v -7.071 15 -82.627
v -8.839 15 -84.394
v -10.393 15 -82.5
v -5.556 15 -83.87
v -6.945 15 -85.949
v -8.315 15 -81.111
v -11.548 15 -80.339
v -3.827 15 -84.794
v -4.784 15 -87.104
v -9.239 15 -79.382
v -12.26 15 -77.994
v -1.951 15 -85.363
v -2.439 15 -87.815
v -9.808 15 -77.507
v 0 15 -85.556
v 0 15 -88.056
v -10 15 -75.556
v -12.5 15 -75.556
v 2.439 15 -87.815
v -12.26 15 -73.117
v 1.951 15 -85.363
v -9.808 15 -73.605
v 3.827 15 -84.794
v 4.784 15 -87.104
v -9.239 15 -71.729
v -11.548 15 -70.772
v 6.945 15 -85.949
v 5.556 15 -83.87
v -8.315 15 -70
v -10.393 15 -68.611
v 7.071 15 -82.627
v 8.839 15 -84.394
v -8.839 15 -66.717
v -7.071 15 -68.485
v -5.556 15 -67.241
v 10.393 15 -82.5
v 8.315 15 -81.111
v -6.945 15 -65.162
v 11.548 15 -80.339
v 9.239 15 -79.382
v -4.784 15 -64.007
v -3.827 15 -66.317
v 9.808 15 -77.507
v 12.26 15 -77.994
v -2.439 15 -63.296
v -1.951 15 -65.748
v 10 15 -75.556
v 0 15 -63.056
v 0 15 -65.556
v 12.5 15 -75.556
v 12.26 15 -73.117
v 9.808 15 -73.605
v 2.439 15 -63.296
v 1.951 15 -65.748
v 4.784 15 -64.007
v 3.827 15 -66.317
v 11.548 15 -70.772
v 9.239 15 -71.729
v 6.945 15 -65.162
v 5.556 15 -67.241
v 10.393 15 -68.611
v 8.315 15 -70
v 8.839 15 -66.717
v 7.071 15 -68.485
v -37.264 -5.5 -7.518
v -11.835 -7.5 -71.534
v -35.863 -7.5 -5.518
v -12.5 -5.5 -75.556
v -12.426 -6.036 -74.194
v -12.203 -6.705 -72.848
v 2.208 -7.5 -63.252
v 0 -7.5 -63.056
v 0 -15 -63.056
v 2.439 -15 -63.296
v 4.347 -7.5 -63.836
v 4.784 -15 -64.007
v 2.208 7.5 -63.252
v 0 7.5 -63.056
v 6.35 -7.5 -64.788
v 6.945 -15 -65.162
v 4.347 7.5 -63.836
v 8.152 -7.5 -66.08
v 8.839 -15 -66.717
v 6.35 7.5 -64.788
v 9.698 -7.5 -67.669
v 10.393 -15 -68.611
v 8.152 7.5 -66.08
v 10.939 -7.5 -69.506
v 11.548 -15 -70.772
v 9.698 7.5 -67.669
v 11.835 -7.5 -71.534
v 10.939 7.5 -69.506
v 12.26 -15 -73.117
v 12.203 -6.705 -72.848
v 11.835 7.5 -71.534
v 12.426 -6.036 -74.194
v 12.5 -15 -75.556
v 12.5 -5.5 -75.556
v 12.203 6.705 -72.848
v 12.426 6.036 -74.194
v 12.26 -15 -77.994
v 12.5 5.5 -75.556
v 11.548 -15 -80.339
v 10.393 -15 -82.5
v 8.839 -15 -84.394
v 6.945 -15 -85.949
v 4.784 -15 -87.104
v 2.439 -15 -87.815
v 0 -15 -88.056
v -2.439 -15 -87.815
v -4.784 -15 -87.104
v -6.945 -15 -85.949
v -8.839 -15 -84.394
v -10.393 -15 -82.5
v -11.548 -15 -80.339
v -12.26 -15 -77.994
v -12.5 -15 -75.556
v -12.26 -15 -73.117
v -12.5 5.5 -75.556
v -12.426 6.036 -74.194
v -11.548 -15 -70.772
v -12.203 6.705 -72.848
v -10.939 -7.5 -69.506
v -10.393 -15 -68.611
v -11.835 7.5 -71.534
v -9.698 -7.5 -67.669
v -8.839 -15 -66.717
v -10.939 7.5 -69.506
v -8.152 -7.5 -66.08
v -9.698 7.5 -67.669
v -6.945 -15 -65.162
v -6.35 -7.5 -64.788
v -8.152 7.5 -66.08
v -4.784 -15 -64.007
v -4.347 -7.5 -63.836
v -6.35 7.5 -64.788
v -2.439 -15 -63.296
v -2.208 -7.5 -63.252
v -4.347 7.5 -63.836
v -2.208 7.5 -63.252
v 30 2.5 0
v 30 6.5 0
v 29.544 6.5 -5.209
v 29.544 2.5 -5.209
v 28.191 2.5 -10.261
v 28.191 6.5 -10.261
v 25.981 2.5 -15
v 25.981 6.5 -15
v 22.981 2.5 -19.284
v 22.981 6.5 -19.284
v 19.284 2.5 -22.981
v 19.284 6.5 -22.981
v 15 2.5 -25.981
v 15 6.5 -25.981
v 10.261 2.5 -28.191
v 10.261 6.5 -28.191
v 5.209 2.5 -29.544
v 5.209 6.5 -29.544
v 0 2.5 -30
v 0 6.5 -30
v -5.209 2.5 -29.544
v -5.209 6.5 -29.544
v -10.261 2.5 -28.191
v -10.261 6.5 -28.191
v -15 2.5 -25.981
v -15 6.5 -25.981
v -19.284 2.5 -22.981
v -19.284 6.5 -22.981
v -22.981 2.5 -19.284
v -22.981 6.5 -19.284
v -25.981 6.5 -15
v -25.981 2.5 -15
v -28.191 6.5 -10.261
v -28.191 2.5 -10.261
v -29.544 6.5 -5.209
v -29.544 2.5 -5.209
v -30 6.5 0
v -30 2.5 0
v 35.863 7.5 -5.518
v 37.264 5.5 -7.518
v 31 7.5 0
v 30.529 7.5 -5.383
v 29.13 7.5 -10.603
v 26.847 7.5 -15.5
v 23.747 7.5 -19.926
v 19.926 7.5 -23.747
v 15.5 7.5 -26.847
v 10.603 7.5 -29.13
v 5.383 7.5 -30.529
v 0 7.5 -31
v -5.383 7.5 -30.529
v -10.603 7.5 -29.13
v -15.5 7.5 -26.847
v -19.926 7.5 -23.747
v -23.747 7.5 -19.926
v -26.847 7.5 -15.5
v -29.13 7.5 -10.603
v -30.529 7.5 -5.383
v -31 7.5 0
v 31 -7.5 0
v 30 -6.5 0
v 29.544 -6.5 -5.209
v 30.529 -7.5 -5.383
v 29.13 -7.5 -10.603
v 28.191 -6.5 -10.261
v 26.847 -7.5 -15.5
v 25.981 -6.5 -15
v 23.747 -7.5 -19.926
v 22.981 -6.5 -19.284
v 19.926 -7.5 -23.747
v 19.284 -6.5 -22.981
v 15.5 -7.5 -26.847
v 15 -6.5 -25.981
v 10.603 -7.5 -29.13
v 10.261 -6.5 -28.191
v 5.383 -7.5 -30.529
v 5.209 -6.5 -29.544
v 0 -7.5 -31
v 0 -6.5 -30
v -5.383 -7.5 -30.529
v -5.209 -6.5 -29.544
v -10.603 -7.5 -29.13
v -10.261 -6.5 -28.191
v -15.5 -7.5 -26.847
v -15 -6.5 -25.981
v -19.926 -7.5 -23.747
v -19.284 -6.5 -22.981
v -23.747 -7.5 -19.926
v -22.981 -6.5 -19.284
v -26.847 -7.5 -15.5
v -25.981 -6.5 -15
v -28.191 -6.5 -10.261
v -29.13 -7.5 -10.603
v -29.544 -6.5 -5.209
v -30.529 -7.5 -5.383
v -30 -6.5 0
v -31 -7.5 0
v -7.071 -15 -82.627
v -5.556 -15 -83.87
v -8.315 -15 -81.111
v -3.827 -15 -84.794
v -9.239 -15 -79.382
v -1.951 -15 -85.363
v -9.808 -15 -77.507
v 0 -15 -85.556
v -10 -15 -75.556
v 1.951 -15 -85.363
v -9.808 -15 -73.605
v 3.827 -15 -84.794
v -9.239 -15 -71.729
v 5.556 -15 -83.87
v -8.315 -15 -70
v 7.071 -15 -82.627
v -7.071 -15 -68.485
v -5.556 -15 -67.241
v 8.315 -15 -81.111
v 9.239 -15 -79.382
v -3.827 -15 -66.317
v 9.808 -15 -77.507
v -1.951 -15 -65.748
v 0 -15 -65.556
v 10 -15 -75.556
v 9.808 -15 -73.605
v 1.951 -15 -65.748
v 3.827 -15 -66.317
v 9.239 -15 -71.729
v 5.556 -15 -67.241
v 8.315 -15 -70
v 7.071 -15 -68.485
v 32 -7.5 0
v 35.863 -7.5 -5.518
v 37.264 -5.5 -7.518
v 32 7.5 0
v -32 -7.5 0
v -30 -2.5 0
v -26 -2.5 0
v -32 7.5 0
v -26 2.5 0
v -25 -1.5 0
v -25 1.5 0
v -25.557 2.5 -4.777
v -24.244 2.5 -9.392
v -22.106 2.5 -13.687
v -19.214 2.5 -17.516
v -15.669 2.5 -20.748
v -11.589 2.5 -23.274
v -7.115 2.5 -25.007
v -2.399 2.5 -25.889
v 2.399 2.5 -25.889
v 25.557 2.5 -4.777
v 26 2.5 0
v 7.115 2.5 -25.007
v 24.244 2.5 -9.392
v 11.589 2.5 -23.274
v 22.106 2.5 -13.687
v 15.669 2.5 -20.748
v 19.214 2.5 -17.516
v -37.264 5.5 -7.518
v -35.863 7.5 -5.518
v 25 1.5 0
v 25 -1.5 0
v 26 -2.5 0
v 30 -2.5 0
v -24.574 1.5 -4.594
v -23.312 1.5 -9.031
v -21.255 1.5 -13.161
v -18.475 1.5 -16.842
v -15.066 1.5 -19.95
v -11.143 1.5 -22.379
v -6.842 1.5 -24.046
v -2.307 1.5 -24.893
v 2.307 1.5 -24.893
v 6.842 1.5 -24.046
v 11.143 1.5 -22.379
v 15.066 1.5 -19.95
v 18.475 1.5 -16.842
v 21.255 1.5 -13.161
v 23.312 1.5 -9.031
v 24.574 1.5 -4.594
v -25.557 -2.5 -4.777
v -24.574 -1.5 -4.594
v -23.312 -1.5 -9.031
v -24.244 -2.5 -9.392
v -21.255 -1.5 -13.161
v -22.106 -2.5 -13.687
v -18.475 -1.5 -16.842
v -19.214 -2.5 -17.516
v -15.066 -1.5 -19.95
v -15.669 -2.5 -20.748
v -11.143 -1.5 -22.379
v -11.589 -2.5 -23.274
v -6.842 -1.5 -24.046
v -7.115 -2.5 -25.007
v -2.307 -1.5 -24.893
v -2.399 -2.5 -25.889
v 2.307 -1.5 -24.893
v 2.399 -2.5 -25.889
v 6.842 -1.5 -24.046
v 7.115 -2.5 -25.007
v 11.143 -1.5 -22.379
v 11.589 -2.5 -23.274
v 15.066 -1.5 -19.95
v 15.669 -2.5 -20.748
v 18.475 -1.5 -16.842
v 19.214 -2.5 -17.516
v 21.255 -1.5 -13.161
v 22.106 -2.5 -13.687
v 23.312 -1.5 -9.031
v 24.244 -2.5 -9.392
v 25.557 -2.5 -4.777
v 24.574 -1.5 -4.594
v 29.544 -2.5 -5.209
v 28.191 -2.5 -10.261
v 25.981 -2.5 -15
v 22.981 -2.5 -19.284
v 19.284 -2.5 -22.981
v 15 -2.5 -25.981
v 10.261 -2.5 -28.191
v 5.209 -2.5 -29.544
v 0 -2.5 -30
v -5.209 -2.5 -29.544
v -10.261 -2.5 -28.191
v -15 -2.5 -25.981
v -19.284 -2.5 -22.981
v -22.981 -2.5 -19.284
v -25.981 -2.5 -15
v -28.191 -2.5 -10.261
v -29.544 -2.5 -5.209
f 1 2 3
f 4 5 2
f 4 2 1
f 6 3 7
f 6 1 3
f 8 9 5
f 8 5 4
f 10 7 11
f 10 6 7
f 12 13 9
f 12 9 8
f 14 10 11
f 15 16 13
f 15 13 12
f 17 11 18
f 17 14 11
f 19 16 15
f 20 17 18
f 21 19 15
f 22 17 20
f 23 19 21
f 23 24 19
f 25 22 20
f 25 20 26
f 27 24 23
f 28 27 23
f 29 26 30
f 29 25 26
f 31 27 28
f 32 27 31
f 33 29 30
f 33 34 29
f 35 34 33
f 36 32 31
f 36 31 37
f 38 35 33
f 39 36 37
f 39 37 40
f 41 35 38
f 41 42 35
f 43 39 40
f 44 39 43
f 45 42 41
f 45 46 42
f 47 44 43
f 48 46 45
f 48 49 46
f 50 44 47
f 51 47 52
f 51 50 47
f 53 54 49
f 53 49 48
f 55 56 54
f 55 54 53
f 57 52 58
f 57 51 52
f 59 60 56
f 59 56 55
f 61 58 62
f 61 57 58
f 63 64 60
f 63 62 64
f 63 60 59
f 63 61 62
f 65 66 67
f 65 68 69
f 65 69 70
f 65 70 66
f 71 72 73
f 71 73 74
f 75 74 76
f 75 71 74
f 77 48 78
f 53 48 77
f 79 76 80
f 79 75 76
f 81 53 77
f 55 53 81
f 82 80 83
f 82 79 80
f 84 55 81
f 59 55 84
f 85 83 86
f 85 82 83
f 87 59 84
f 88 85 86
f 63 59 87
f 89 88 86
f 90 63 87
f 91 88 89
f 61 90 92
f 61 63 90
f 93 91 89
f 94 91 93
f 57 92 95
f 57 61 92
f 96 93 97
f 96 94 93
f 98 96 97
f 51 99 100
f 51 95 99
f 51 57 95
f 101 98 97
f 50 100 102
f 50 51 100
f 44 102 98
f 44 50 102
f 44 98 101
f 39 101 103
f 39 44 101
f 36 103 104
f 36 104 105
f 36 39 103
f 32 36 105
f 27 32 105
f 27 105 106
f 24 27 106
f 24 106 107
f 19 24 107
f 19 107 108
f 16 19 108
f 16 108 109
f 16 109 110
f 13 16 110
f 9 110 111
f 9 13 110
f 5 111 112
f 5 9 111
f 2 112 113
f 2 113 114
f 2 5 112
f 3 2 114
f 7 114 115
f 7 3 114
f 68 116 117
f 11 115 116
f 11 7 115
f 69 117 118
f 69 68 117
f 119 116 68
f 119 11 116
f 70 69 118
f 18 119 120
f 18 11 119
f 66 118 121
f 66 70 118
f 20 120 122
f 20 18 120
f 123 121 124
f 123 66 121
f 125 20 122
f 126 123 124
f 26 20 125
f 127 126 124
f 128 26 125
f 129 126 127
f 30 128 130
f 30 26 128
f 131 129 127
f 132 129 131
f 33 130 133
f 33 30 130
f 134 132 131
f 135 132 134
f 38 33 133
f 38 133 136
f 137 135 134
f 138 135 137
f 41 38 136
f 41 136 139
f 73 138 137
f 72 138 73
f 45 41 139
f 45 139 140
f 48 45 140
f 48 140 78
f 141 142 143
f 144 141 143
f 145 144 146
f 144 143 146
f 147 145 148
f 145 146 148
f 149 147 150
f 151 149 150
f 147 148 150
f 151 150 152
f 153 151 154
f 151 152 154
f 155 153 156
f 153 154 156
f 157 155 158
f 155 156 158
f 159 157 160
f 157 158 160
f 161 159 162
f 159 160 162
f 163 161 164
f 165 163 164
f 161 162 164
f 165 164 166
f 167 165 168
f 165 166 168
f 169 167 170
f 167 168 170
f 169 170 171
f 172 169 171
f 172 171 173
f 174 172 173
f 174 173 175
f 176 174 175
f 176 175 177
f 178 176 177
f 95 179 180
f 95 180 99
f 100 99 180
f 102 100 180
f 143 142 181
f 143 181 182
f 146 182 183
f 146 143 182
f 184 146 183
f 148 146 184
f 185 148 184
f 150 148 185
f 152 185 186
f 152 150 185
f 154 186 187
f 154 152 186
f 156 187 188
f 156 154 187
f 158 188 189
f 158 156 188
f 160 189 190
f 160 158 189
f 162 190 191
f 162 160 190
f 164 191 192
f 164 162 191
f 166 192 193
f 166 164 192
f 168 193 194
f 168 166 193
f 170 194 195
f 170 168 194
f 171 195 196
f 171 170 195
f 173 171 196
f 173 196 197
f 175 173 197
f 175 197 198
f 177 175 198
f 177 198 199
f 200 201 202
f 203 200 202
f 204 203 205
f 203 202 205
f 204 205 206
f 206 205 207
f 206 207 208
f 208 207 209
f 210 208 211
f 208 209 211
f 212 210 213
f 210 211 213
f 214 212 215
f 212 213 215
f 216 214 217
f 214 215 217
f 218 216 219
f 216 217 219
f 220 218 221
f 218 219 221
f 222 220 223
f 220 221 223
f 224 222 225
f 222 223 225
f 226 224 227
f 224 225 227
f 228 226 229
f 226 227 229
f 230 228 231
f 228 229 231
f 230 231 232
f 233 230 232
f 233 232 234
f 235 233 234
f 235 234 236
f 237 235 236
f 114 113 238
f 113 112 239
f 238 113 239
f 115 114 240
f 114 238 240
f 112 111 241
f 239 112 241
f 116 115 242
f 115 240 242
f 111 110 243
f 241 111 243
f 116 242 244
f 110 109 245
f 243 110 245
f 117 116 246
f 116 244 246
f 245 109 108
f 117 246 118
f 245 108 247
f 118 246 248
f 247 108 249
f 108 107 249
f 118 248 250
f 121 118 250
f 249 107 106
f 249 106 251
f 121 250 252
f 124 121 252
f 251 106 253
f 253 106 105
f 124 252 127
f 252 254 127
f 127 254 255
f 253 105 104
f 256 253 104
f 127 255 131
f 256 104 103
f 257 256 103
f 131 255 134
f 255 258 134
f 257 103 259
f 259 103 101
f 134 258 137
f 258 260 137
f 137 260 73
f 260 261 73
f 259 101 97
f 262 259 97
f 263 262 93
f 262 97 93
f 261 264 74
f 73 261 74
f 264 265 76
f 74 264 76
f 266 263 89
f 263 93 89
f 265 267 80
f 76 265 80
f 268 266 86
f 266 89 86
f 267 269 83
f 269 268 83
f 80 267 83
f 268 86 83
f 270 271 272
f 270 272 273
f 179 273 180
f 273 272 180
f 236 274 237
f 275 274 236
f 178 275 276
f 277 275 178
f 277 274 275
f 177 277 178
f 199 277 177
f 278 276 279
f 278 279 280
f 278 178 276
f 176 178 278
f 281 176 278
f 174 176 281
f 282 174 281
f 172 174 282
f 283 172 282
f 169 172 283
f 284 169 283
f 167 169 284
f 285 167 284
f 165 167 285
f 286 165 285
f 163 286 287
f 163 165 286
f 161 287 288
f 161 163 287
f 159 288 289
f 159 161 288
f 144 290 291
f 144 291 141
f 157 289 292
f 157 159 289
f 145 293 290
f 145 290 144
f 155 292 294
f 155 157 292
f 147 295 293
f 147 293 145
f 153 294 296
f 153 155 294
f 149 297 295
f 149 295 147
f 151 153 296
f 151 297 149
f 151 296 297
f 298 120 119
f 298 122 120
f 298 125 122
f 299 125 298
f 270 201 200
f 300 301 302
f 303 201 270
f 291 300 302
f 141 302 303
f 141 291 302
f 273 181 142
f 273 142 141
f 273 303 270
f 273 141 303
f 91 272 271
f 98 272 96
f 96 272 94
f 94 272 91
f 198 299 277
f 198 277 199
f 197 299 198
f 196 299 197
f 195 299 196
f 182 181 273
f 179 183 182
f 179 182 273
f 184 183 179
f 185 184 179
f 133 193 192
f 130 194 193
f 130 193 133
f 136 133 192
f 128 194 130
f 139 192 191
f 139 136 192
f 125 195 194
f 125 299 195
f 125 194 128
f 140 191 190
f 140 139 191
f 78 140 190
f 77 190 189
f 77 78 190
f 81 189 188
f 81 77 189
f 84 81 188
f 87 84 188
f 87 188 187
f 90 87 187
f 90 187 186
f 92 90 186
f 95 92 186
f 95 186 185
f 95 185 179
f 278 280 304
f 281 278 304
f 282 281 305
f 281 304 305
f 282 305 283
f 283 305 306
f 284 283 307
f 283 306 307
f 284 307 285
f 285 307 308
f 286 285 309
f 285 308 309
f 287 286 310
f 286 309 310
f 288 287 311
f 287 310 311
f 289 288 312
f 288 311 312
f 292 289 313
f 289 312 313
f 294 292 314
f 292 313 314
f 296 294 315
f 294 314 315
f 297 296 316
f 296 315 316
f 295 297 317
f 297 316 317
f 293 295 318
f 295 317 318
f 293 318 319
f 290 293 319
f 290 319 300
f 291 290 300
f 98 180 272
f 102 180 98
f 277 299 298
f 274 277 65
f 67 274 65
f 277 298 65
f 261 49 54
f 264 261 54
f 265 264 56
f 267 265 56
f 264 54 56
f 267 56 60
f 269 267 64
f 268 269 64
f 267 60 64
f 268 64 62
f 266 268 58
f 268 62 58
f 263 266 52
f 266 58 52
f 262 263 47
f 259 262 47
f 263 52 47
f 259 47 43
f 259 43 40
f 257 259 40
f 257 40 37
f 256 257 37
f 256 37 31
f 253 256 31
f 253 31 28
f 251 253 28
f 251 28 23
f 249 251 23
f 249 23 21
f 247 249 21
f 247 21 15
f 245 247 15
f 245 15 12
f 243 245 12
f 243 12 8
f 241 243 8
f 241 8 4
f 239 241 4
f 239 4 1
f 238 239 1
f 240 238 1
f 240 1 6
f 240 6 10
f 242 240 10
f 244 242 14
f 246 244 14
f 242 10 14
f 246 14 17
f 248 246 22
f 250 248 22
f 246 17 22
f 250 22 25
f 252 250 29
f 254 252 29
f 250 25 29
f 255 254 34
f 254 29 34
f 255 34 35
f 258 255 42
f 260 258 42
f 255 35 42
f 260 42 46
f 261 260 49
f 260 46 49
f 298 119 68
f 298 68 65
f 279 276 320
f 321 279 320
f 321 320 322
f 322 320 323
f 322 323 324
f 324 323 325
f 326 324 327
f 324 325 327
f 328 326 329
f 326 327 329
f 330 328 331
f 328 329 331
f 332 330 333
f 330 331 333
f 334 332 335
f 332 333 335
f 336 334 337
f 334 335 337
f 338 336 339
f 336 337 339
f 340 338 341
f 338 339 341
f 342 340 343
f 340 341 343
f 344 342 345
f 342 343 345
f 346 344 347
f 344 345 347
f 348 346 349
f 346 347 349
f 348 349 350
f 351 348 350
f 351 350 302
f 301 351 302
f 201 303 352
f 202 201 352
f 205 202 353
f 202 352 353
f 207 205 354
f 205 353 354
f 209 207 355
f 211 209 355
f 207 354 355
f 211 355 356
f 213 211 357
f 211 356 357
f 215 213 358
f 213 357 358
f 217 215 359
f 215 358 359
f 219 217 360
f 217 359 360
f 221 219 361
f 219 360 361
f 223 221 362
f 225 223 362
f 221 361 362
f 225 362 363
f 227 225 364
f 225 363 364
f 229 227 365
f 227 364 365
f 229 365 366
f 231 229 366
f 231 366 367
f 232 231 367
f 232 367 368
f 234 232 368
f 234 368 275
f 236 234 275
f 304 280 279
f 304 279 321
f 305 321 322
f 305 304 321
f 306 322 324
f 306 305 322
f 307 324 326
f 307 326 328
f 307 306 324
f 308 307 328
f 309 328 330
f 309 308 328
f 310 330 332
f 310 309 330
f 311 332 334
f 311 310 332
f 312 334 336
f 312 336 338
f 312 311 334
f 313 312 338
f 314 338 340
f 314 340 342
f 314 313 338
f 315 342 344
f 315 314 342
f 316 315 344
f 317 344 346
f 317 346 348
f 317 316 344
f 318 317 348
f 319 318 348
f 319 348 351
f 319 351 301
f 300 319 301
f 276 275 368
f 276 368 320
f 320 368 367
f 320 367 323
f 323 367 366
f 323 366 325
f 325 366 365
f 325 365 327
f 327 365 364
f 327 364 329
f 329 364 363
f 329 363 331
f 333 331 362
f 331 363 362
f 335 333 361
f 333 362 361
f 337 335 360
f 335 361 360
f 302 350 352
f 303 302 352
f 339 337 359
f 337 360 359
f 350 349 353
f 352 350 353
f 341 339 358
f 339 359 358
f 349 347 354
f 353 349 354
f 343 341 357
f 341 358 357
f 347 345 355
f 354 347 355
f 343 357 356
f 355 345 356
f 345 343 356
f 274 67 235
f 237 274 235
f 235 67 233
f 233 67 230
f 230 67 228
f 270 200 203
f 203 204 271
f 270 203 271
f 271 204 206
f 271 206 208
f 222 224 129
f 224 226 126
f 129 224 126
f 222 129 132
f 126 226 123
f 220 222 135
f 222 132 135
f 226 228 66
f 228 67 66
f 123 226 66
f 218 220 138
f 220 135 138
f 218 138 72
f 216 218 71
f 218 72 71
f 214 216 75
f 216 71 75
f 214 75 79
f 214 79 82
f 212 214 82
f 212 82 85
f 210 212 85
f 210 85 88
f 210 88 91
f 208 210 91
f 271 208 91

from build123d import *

# Parameters (mm, degrees)
BOSS_EXTRUDE1_DEPTH = 7.5
SKETCH2_R           = 12.5
BOSS_EXTRUDE2_DEPTH = 15
SKETCH3_R           = 30
CUT_EXTRUDE1_DEPTH  = 15
BOSS_EXTRUDE3_DEPTH = 2.5
SKETCH5_R           = 10
CUT_EXTRUDE2_DEPTH  = 102.261018189
CHAMFER1_SIZE       = 1
CHAMFER2_SIZE       = 8
CHAMFER3_SIZE       = 2


with BuildPart() as part:
    # Sketch1 → Boss-Extrude1 (new, symmetric)
    with BuildSketch(Plane(origin=(0, 0, 0), x_dir=(1, 0, 0), z_dir=(0, 1, 0))):
        Polygon((-40, 0), (40, 0), (12.5, 75.555629035), (-12.5, 75.555629035), align=None)
    extrude(amount=BOSS_EXTRUDE1_DEPTH, both=True)

    # Sketch2 → Boss-Extrude2 (add, symmetric)
    with BuildSketch(Plane(origin=(0, 0, 0), x_dir=(1, 0, 0), z_dir=(0, 1, 0))):
        with Locations(Location((0, 75.555629035, 0), (0, 0, 270))):
            Circle(SKETCH2_R)
    extrude(amount=BOSS_EXTRUDE2_DEPTH, both=True)

    # Sketch3 → Cut-Extrude1 (cut, symmetric)
    with BuildSketch(Plane(origin=(0, 0, 0), x_dir=(1, 0, 0), z_dir=(0, 1, 0))):
        Circle(SKETCH3_R)
    extrude(amount=CUT_EXTRUDE1_DEPTH, both=True, mode=Mode.SUBTRACT)

    # Sketch4 → Boss-Extrude3 (add, symmetric)
    with BuildSketch(Plane(origin=(0, 0, 0), x_dir=(1, 0, 0), z_dir=(0, 1, 0))):
        with BuildLine():
            Line((-30, 0), (-25, 0))
            ThreePointArc((-25, 0), (0, 25), (25, 0))
            Line((25, 0), (30, 0))
            ThreePointArc((30, 0), (0, 30), (-30, 0))
        make_face()
    extrude(amount=BOSS_EXTRUDE3_DEPTH, both=True)

    # Sketch5 → Cut-Extrude2 (cut, through all)
    with BuildSketch(Plane(origin=(0, 15, 0), x_dir=(1, 0, 0), z_dir=(0, 1, 0))):
        with Locations(Location((0, 75.555629035, 0), (0, 0, 270))):
            Circle(SKETCH5_R)
    extrude(amount=-CUT_EXTRUDE2_DEPTH, mode=Mode.SUBTRACT)

    # Chamfer1
    chamfer1_edges = [part.edges().sort_by_distance(p)[0] for p in [
        (0, -7.5, -30),
        (0, 7.5, -30),
        (0, -2.5, -25),
        (0, 2.5, -25),
    ]]
    chamfer(chamfer1_edges, length=CHAMFER1_SIZE)

    # Chamfer2
    chamfer2_edges = [part.edges().sort_by_distance(p)[0] for p in [
        (40, 0, 0),
        (-40, 0, 0),
    ]]
    chamfer(chamfer2_edges, length=CHAMFER2_SIZE)

    # Chamfer3
    chamfer3_edges = [part.edges().sort_by_distance(p)[0] for p in [
        (-24.881919427, 7.5, -41.536585001),
        (-24.881919427, -7.5, -41.536585001),
        (24.881919427, -7.5, -41.536585001),
        (24.881919427, 7.5, -41.536585001),
    ]]
    chamfer(chamfer3_edges, length=CHAMFER3_SIZE)


solid = part.part
